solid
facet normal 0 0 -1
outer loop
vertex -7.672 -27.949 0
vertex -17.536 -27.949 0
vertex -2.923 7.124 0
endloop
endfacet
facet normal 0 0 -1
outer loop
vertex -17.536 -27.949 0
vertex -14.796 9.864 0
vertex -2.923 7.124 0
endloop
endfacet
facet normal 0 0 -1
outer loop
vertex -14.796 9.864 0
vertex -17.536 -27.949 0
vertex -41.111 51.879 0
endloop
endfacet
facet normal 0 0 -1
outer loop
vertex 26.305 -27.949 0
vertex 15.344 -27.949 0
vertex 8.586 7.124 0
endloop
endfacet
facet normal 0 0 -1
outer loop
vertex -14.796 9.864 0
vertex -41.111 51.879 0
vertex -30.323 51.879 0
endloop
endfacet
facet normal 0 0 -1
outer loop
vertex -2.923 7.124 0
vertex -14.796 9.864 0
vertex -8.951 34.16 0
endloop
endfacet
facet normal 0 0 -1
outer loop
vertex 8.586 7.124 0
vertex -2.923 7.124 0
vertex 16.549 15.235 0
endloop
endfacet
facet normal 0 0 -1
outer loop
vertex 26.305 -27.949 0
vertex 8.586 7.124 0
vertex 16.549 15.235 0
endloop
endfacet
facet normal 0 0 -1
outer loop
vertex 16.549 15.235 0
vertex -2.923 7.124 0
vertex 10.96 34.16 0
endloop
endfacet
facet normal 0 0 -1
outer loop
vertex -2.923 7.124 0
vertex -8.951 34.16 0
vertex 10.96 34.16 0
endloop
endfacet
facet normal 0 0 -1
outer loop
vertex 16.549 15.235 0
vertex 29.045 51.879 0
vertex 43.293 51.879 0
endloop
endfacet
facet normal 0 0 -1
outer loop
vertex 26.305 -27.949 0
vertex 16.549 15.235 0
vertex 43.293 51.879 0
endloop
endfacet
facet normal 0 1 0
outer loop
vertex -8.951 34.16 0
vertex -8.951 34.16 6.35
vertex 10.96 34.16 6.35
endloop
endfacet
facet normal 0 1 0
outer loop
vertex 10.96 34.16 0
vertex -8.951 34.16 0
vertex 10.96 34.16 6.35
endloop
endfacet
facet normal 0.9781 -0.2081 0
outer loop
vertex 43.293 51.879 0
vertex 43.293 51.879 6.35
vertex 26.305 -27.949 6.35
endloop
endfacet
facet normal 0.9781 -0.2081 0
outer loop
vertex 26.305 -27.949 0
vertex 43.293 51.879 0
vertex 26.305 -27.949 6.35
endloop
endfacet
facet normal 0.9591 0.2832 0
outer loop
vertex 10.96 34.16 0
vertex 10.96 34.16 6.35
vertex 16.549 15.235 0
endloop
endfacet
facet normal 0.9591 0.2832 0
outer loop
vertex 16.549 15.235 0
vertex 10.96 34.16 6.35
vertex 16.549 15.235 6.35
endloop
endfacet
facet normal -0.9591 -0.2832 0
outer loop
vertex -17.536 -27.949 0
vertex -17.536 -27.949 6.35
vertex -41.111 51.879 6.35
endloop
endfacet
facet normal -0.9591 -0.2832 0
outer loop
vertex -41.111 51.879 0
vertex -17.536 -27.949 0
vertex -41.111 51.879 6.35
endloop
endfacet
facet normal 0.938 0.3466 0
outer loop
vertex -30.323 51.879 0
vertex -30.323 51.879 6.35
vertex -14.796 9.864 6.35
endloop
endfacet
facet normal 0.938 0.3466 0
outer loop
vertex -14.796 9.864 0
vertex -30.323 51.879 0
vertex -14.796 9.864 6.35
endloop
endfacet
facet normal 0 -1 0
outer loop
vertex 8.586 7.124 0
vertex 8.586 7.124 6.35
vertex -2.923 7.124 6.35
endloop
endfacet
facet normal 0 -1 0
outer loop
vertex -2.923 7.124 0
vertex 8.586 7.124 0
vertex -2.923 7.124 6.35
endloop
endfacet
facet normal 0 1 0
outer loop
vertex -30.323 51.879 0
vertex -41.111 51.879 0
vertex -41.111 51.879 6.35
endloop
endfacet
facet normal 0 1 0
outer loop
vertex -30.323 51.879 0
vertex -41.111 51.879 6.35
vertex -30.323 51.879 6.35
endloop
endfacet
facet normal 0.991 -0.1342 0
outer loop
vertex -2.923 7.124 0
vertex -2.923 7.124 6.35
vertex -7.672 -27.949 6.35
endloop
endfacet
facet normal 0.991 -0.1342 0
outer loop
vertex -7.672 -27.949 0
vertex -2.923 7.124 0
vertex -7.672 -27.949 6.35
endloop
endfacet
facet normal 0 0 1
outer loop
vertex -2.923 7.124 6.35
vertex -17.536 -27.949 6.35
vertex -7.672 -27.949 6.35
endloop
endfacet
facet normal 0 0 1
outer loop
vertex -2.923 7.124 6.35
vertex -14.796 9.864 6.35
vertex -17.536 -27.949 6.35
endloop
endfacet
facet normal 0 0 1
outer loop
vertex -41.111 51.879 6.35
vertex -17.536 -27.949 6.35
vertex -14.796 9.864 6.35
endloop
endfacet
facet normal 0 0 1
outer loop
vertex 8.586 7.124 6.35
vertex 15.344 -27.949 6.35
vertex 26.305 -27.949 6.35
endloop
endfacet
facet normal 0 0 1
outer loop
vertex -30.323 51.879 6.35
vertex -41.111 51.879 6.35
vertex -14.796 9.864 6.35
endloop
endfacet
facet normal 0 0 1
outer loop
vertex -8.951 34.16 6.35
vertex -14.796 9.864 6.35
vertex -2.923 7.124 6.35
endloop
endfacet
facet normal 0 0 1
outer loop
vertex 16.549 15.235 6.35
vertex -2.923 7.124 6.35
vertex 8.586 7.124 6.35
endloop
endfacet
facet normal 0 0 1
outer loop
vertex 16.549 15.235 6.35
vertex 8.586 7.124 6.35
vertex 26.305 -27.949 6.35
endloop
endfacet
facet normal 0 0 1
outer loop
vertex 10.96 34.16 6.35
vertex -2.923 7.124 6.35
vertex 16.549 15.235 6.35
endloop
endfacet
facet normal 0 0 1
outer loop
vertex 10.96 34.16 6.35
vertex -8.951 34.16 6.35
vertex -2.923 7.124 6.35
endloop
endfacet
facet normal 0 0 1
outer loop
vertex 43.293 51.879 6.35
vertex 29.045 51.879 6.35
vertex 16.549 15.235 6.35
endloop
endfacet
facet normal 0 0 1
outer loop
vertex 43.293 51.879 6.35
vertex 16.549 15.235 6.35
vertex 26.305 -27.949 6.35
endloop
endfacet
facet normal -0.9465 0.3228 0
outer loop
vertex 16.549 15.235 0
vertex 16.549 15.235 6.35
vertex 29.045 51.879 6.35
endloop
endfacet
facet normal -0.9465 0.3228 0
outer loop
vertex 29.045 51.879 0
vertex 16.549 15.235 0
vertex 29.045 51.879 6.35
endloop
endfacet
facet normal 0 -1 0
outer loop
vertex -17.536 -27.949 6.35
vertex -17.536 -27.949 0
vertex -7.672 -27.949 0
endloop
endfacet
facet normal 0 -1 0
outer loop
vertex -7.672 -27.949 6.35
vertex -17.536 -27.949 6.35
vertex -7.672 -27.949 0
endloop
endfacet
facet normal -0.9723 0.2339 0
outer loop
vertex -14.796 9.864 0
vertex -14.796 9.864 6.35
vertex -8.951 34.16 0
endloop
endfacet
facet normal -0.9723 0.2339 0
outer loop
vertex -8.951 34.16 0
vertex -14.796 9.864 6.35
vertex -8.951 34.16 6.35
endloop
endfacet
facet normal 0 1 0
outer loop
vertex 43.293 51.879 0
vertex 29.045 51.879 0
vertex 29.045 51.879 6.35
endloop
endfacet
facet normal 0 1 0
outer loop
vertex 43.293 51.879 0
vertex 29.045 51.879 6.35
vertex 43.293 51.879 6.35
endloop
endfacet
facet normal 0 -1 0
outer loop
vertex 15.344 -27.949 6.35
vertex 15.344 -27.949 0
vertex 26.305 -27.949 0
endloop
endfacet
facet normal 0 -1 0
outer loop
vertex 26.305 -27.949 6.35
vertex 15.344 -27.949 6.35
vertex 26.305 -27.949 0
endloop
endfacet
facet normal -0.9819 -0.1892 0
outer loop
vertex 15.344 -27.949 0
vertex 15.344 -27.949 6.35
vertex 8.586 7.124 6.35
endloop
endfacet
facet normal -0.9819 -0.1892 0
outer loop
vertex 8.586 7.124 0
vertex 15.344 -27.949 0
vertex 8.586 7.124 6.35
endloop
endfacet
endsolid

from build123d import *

# Parameters (mm, degrees)
F0_W     = 84.4042
F0_H     = 79.8273328692
F1_DEPTH = 6.35
F3_DEPTH = 25.4


with BuildPart() as f1:
    # F0 (on Top) → F1 (new body)
    with BuildSketch(Plane.XY):
        with Locations((1.090981224, 11.9649684057)):
            Rectangle(F0_W, F0_H)
    extrude(amount=F1_DEPTH)

    # F2 (on face) → F3 (cut)
    with BuildSketch(Plane.XY.offset(6.35)):
        Polygon((-17.5364390016, -27.9486980289), (-41.111118776, 51.8786348402), (-41.111118776, -27.9486980289), align=None)
        Polygon((29.0447268635, 51.8786348403), (-30.3234253079, 51.8786348403), (-14.7963697091, 9.864247404), (-8.9508909732, 34.1595225036), (10.960274376, 34.1595225036), (16.5489539437, 15.2354315543), align=None)
        Polygon((43.293081224, -27.9486980289), (43.293081224, 51.8786348403), (26.3046585023, -27.9486980289), align=None)
        Polygon((-2.9227398336, 7.1241795085), (-7.6721920632, -27.9486980289), (15.3443841264, -27.9486980289), (8.5855480283, 7.1241795085), align=None)
    extrude(amount=-F3_DEPTH, mode=Mode.SUBTRACT)


solid = f1.part
